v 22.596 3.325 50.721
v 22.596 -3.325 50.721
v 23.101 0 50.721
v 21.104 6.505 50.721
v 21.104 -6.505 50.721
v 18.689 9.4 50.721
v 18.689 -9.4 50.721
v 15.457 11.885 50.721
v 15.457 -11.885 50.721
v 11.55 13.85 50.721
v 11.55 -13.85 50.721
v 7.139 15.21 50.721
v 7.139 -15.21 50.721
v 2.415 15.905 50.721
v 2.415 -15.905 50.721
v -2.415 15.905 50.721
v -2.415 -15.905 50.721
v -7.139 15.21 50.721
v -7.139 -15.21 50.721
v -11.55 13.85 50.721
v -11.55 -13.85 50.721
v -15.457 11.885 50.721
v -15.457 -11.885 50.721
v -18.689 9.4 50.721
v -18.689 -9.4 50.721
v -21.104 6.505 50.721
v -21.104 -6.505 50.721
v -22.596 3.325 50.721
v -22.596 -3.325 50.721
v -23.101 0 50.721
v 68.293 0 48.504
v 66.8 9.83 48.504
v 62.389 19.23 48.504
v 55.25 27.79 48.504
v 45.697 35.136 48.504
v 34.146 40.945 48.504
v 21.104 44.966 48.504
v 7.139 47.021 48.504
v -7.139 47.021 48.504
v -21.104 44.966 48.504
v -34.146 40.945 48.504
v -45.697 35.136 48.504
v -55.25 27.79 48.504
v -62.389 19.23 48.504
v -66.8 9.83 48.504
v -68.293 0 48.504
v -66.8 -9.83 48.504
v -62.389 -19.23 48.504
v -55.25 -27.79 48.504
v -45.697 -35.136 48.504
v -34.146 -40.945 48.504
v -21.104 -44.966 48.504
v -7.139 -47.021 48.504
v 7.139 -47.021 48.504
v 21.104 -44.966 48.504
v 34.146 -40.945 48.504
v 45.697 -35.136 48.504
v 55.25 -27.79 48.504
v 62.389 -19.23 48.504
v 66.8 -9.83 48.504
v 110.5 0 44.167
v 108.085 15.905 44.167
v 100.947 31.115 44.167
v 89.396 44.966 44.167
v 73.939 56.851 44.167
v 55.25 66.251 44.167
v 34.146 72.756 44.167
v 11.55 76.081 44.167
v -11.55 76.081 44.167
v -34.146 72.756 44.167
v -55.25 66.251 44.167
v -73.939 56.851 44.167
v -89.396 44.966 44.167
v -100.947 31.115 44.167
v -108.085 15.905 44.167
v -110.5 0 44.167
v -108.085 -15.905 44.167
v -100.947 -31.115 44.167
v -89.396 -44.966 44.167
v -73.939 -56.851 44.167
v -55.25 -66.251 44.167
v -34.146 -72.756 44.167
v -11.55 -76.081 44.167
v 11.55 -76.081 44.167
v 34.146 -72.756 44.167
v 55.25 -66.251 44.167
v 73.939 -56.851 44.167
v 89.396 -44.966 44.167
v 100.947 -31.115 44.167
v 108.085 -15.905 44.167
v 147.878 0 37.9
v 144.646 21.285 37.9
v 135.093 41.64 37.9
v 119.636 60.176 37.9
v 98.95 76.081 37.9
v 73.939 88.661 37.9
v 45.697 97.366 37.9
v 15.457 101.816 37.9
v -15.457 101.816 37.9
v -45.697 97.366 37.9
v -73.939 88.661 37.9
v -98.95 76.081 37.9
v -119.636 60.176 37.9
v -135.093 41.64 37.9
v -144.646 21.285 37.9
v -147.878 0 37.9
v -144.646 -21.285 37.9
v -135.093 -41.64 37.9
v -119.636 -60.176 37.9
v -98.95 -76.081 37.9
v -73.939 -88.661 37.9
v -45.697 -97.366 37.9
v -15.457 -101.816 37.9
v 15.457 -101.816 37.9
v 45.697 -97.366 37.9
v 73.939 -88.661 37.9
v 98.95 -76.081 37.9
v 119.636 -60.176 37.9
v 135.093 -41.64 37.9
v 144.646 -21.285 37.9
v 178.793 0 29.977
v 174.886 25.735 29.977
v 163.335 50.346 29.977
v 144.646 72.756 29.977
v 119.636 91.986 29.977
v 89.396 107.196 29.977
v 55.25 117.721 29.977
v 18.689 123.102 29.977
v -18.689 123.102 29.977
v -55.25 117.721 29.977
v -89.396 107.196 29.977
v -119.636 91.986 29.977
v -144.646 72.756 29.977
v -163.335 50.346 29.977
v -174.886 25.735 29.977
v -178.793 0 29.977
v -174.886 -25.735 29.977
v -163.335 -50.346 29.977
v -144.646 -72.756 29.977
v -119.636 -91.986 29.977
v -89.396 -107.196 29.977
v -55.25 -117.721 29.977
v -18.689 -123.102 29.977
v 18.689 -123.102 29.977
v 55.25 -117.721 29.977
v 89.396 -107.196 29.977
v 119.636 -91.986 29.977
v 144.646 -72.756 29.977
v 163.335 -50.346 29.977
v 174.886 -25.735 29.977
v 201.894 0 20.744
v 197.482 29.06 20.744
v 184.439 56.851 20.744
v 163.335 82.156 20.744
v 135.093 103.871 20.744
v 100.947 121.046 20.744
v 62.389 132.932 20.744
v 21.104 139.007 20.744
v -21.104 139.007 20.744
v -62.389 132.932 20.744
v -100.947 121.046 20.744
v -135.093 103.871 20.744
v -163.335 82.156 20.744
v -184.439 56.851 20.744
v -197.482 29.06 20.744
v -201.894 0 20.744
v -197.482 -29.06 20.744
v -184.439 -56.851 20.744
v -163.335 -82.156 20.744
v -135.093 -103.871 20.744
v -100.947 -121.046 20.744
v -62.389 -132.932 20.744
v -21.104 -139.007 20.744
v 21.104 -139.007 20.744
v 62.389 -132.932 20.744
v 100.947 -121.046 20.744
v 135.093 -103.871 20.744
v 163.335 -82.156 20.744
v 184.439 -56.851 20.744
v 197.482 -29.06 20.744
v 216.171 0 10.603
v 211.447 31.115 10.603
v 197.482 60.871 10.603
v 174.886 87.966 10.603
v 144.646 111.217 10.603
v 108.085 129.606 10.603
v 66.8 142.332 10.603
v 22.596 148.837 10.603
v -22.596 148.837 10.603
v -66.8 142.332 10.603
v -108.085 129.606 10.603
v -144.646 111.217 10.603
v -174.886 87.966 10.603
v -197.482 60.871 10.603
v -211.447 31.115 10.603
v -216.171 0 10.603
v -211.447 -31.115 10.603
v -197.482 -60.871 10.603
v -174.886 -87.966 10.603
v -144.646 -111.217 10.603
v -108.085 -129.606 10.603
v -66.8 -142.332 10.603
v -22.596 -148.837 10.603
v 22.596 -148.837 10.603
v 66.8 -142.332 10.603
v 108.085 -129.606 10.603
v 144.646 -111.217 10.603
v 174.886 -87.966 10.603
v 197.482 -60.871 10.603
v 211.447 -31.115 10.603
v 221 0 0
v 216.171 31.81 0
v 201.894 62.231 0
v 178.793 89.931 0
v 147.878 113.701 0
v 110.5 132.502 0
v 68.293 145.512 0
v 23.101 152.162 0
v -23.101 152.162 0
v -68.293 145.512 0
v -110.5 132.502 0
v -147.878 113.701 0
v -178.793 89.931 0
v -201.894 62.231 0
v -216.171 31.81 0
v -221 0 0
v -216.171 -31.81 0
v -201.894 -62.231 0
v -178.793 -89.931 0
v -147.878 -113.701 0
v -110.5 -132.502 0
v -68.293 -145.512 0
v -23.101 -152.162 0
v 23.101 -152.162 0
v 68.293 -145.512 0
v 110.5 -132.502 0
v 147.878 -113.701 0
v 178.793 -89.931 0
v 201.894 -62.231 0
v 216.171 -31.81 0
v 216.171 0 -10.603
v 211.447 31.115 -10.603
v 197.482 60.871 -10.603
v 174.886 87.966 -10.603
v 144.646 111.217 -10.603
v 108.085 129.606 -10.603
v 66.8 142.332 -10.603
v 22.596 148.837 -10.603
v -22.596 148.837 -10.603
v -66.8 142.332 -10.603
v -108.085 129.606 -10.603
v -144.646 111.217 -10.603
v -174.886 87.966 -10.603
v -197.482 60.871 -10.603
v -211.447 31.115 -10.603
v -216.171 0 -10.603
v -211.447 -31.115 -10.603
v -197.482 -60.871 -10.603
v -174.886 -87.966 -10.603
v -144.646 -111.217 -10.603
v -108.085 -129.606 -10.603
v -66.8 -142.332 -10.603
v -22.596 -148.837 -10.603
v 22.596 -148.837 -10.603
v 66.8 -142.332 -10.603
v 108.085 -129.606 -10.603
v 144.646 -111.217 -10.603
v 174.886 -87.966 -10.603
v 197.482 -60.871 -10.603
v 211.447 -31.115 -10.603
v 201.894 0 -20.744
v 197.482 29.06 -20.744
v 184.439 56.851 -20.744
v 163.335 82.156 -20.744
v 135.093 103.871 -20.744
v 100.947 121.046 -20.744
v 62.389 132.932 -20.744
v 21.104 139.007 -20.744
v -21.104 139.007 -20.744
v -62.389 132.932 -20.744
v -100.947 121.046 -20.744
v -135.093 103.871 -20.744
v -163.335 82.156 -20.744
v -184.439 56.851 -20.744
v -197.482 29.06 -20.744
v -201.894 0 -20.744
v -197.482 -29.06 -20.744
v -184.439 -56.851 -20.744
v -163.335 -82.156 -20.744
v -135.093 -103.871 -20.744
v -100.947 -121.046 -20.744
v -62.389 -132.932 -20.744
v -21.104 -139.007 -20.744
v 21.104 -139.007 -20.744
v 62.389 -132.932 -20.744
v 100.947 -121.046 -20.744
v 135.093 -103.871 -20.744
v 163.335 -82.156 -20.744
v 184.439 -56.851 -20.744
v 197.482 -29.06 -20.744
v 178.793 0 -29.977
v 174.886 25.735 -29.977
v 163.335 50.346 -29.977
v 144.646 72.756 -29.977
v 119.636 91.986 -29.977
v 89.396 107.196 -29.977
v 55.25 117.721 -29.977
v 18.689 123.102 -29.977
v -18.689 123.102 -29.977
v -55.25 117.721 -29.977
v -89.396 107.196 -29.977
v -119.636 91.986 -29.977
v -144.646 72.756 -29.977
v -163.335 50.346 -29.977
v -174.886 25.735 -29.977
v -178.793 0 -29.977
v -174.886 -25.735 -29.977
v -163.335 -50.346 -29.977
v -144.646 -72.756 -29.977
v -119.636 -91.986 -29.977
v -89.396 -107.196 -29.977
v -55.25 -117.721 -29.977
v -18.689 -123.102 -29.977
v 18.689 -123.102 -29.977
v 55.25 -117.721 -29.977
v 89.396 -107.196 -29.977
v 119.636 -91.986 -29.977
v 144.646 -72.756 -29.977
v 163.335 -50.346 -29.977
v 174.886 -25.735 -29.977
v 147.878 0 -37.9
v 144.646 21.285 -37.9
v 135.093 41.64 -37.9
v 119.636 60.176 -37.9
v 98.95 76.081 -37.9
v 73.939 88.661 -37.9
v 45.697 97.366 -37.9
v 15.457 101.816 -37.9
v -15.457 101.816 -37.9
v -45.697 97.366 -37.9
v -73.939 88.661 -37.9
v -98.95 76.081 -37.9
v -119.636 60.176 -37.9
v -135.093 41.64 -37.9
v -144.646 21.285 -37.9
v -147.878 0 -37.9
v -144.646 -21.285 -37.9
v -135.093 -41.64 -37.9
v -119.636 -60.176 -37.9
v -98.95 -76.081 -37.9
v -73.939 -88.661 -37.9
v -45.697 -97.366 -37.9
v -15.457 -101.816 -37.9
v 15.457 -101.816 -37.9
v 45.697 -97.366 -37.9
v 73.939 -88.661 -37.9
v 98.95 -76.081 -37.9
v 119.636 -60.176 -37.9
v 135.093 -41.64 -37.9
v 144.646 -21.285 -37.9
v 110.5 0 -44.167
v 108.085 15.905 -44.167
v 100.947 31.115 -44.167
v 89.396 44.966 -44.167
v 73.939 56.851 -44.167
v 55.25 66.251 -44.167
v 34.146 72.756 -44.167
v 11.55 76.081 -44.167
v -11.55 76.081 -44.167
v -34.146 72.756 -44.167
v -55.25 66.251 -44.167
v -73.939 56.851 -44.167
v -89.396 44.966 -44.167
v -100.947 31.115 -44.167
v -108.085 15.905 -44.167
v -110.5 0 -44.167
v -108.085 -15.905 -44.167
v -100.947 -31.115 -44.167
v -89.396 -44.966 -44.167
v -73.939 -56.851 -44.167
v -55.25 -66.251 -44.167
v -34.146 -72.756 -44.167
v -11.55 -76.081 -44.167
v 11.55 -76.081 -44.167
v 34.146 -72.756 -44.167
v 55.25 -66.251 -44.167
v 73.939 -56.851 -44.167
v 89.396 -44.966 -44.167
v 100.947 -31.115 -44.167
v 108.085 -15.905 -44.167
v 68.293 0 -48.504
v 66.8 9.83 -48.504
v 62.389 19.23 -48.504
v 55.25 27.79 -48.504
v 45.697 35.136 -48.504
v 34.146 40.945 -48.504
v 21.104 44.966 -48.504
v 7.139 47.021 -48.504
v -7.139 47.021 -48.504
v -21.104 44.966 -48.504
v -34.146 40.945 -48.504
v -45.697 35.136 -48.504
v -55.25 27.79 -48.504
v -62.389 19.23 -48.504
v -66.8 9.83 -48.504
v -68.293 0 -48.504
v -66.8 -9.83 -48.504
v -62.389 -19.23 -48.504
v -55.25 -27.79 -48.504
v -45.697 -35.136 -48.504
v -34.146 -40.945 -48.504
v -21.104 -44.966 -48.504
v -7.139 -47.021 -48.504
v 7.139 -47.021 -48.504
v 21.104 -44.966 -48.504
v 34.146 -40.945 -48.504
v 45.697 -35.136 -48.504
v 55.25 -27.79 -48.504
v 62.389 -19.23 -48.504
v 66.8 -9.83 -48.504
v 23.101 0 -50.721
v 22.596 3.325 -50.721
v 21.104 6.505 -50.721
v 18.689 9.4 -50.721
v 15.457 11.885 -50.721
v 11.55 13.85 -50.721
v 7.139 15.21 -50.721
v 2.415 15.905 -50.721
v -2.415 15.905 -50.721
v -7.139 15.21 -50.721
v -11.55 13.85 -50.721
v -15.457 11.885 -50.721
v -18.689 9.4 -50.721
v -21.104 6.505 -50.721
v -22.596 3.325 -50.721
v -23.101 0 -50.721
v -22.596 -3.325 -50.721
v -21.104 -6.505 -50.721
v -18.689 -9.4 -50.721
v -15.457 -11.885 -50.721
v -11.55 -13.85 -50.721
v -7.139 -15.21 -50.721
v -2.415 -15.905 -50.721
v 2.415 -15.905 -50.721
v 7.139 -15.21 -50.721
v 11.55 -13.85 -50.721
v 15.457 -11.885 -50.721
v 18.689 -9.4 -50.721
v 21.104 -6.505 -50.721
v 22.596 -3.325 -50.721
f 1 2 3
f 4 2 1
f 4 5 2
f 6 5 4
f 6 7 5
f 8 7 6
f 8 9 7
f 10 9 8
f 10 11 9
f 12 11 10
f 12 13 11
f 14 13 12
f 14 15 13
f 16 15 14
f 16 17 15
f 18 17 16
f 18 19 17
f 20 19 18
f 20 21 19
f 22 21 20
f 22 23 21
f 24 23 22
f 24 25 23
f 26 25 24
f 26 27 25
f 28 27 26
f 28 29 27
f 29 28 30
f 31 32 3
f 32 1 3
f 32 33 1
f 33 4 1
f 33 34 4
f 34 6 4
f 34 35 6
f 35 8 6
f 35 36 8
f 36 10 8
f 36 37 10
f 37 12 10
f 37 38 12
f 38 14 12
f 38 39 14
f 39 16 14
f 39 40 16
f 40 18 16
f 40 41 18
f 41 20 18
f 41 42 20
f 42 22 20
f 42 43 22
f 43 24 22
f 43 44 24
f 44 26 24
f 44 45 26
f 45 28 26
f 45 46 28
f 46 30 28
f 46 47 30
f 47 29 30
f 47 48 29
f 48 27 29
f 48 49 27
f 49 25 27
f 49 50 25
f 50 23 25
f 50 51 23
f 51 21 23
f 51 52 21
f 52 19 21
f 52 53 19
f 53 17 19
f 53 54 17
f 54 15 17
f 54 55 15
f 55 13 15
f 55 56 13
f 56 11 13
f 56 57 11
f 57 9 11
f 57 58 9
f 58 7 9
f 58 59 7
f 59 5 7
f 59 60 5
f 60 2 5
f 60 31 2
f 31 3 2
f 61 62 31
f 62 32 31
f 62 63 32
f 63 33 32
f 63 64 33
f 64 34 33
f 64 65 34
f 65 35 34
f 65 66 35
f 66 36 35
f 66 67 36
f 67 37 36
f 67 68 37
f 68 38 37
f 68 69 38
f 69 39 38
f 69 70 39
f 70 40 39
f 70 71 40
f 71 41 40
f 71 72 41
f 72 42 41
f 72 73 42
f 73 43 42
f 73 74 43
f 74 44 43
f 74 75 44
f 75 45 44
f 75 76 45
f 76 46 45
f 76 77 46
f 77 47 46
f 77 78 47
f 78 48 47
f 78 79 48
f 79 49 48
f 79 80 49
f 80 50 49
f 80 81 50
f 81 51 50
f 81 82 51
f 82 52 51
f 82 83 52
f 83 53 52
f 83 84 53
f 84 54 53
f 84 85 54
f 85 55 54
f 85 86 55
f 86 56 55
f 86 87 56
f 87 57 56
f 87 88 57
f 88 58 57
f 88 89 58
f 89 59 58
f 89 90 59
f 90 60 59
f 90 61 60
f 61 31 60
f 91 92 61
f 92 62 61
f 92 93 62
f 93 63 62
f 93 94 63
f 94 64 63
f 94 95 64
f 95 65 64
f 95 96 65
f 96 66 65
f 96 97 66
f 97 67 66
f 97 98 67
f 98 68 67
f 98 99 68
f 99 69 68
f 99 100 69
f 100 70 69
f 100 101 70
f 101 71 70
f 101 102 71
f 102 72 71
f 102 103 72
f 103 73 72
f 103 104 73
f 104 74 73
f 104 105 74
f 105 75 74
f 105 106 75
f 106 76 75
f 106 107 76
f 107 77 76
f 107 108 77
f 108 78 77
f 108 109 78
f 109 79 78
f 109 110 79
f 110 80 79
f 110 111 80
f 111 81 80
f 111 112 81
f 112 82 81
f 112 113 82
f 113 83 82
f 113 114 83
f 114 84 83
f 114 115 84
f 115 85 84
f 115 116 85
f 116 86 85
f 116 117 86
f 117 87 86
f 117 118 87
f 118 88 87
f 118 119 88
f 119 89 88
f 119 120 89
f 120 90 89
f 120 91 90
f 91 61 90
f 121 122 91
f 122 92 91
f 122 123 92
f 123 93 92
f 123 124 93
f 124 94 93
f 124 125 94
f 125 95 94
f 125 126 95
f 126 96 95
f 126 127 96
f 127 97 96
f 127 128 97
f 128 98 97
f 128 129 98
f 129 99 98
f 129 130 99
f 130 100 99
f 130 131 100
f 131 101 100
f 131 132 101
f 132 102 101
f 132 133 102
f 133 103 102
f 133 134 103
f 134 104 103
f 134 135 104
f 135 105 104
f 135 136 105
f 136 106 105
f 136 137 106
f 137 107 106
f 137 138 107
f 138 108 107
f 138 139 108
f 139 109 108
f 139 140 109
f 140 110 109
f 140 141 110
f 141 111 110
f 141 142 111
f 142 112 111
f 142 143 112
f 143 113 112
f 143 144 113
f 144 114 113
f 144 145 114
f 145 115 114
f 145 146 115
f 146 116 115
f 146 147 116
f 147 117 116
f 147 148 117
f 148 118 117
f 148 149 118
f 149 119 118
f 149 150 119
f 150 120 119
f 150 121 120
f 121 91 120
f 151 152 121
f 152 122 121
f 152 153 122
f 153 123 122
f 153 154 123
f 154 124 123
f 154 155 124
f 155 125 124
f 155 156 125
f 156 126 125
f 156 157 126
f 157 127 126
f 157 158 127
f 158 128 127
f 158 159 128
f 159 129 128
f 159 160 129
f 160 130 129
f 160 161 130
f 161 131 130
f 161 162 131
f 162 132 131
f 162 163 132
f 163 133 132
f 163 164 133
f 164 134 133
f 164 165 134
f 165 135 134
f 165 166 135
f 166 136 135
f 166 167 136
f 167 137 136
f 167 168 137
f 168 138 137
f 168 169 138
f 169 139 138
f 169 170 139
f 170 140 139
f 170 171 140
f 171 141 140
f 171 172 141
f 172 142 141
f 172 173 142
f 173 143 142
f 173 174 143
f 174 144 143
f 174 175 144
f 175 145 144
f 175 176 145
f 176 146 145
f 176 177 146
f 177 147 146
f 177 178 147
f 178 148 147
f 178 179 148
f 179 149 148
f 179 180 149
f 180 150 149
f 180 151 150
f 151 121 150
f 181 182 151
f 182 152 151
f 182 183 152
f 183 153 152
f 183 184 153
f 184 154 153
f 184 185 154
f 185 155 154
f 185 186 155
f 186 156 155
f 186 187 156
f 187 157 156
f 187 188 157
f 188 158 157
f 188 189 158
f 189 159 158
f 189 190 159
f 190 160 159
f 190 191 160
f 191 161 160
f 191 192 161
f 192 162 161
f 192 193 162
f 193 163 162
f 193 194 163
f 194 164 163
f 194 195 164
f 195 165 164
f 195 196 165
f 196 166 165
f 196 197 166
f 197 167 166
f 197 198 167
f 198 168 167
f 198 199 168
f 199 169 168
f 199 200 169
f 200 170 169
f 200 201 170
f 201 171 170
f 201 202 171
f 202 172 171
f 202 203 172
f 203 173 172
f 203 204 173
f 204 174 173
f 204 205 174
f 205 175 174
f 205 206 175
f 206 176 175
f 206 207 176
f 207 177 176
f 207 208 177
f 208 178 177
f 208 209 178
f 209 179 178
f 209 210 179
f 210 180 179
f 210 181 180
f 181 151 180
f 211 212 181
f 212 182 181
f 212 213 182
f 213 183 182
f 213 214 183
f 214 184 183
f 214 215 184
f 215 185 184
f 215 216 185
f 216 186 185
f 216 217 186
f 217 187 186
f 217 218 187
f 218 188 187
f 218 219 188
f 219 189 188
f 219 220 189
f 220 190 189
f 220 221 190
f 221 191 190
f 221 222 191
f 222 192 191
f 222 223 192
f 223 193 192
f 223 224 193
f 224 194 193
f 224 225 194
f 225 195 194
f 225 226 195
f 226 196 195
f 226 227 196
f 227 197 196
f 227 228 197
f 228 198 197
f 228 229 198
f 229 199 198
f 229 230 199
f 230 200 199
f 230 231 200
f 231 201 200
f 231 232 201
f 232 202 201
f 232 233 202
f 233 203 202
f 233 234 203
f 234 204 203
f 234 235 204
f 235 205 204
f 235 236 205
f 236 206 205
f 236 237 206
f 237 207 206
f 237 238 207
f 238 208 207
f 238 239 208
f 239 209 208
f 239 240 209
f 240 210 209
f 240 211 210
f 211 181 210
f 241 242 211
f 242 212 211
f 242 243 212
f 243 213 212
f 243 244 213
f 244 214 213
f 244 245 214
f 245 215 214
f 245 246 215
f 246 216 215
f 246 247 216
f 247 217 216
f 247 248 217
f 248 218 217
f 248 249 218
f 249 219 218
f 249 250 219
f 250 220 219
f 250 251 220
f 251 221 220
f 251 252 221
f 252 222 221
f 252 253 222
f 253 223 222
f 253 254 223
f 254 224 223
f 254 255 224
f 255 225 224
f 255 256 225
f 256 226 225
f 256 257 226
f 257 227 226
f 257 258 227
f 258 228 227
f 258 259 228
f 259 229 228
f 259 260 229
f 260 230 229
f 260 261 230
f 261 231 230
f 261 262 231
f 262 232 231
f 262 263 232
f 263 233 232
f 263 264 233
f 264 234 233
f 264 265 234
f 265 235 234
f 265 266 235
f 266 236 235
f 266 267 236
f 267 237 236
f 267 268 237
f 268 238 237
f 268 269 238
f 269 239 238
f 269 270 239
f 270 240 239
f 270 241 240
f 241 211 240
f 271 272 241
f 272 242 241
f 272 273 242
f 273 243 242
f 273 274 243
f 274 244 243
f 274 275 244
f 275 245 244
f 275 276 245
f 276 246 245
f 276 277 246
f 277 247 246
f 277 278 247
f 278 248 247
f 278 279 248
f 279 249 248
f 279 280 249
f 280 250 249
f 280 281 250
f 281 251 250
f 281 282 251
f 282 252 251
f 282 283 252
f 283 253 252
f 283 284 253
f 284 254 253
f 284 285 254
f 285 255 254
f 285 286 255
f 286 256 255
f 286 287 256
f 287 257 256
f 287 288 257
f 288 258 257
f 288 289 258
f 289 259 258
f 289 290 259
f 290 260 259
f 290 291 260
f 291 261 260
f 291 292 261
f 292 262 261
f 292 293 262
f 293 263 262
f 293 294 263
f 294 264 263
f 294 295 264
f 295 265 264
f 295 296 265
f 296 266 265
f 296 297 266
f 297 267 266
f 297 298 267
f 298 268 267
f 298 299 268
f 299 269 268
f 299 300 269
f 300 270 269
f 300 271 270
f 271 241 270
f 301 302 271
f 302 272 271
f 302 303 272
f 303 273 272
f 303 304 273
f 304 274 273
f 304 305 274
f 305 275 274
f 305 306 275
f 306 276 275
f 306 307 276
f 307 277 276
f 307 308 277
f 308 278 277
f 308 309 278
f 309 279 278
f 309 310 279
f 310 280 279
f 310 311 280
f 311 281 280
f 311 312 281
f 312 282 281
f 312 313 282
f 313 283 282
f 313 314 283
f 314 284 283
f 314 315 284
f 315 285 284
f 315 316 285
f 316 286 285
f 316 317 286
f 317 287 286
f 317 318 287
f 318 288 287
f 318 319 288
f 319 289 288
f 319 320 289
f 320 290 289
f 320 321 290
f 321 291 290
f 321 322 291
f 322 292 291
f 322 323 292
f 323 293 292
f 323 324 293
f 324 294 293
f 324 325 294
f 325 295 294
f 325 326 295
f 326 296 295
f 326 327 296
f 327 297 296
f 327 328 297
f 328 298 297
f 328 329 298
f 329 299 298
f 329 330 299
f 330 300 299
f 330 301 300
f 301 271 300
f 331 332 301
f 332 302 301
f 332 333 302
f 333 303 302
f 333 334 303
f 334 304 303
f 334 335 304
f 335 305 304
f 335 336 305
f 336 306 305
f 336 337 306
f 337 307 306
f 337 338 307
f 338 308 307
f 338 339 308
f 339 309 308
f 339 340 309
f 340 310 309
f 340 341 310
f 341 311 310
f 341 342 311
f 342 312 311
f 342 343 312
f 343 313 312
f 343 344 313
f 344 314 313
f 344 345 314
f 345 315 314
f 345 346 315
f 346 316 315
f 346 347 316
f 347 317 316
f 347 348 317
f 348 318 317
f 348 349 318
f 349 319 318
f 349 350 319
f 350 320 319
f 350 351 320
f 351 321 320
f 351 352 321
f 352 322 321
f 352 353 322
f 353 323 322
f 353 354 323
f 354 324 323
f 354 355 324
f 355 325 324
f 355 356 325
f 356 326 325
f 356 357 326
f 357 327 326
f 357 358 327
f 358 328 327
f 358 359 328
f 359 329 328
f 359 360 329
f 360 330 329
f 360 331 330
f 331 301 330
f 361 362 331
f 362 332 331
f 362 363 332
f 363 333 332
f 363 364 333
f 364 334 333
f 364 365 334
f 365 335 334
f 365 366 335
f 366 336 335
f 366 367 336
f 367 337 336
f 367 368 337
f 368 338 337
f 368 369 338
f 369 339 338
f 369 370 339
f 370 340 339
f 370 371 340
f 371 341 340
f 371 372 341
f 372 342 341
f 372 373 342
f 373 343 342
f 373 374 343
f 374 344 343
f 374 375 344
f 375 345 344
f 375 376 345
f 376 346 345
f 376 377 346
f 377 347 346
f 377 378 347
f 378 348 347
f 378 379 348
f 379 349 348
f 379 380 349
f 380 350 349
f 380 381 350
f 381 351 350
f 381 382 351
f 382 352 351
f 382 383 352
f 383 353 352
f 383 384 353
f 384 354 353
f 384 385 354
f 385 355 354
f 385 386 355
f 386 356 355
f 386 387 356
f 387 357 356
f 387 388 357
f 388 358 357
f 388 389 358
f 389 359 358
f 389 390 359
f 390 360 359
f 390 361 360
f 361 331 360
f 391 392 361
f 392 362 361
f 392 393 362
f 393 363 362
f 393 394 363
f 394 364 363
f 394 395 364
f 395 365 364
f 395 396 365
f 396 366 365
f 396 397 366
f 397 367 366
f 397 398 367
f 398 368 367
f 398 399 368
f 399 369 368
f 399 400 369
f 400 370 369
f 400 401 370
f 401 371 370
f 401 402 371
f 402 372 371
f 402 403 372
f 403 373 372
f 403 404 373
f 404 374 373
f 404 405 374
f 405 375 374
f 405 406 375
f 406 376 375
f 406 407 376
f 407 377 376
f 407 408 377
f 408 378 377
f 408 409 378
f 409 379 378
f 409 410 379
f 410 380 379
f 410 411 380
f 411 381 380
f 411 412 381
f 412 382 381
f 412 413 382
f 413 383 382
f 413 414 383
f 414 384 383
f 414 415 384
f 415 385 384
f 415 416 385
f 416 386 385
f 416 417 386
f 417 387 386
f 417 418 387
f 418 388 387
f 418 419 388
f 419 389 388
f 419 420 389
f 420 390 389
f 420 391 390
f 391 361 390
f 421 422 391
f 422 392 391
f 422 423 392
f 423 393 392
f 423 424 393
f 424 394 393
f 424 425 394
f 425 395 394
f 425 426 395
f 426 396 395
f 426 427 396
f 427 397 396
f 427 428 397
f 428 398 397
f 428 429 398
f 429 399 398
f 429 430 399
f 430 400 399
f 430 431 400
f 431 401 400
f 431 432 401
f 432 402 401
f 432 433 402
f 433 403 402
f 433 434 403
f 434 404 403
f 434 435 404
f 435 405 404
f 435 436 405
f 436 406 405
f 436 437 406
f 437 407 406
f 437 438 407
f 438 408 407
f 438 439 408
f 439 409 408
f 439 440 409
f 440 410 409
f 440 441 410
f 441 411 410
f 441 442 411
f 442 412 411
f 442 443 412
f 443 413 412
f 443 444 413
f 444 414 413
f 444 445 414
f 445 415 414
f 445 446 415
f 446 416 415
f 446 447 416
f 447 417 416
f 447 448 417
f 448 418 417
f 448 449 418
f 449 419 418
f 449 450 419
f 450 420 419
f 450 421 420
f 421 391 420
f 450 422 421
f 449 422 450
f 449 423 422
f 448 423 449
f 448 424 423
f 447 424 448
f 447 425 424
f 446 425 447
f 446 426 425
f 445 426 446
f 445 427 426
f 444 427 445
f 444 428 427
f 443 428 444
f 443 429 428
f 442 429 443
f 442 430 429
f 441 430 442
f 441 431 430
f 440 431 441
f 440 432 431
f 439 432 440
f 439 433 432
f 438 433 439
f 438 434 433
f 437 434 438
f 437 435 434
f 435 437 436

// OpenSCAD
// Generated by SolidPython 1.0.1 on 2020-07-29 00:46:50


scale(v = [13, 9, 3]) {
	sphere(r = 17);
}
/***********************************************
*********      SolidPython code:      **********
************************************************
 
# import packages: SolidPython
from solid import *
from solid.utils import *
from itertools import chain, combinations, permutations


class Resize:

    def __init__(self, scad_file):
        self.scad_file = scad_file
        #self.scad_file = import_scad(scad_file)
        # cone/cylinder param:
        self.r1 = 0
        self.r2 = 0
        self.h = 0
        # rectangular prism param:
        self.w = 0
        self.l = 0
        # ellipse param:
        self.r = 0

    # import OpenScad code (file name corresponds to shape)


    # classify shape + parameters
    def assign(self, param1, param2, param3):
        if self.scad_file == 'cone.scad':
            self.r1 = param1
            self.r2 = param2
            self.h = param3
        elif self.scad_file == 'cylinder.scad':
            self.r1 = param1
            self.r2 = param2
            self.h = param3
        elif self.scad_file == 'rectangularPrism.scad':
            self.h = param1
            self.l = param2
            self.w = param3
        else:
            self.r = param1
            self.h = param2

    # resize parameters
    def iterate(self):
        x = range(3, 20, 2)
        i = 1
        if self.scad_file == 'cone.scad':
            tempList = list(permutations(x, 2))
            for temp in tempList:
                param1 = temp[0]
                param2 = temp[1]
                filepath = 'produced_scad_files/' + 'cone' + str(param1) + '_' + str(param2) + '_' + '.scad'
                scad_render_to_file(cylinder(h=param1, r1=param2, r2=0), filepath)

        elif self.scad_file == 'cylinder.scad':
            tempList = list(permutations(x, 3))
            for temp in tempList:
                param1 = temp[0]
                param2 = temp[1]
                filepath = 'produced_scad_files/' + 'cylinder' + str(param1) + '_' + str(param2) + '_' + '.scad'
                scad_render_to_file(cylinder(h=param1, r1=param2, r2=param2), filepath)

        elif self.scad_file == 'rectangularPrism.scad':
            tempList = list(permutations(x, 3))
            for temp in tempList:
                param1 = temp[0]
                param2 = temp[1]
                param3 = temp[2]
                filepath = 'produced_scad_files/' + 'rectangularPrism' + str(param1) + '_' + str(param2) + '_' + str(
                    param3) + '.scad'
                scad_render_to_file(cube(size=(param1, param2, param3)), filepath)

        elif self.scad_file == 'ellipse.scad':
            tempList = list(permutations(x, 4))
            for temp in tempList:
                param1 = temp[0]
                param2 = temp[1]
                param3 = temp[2]
                param4 = temp[3]
                filepath = 'produced_scad_files/' + 'ellipse' + str(param1) + '_' + str(param2) + '_' + str(param3) + '_' + str(param4) + '.scad'
                scad_render_to_file(scale([param1, param2, param3])(sphere(r=param4)), filepath)

    def render_to_scadfile(self):
        scad_render_to_file(scad, 'example.scad') 
 
************************************************/
